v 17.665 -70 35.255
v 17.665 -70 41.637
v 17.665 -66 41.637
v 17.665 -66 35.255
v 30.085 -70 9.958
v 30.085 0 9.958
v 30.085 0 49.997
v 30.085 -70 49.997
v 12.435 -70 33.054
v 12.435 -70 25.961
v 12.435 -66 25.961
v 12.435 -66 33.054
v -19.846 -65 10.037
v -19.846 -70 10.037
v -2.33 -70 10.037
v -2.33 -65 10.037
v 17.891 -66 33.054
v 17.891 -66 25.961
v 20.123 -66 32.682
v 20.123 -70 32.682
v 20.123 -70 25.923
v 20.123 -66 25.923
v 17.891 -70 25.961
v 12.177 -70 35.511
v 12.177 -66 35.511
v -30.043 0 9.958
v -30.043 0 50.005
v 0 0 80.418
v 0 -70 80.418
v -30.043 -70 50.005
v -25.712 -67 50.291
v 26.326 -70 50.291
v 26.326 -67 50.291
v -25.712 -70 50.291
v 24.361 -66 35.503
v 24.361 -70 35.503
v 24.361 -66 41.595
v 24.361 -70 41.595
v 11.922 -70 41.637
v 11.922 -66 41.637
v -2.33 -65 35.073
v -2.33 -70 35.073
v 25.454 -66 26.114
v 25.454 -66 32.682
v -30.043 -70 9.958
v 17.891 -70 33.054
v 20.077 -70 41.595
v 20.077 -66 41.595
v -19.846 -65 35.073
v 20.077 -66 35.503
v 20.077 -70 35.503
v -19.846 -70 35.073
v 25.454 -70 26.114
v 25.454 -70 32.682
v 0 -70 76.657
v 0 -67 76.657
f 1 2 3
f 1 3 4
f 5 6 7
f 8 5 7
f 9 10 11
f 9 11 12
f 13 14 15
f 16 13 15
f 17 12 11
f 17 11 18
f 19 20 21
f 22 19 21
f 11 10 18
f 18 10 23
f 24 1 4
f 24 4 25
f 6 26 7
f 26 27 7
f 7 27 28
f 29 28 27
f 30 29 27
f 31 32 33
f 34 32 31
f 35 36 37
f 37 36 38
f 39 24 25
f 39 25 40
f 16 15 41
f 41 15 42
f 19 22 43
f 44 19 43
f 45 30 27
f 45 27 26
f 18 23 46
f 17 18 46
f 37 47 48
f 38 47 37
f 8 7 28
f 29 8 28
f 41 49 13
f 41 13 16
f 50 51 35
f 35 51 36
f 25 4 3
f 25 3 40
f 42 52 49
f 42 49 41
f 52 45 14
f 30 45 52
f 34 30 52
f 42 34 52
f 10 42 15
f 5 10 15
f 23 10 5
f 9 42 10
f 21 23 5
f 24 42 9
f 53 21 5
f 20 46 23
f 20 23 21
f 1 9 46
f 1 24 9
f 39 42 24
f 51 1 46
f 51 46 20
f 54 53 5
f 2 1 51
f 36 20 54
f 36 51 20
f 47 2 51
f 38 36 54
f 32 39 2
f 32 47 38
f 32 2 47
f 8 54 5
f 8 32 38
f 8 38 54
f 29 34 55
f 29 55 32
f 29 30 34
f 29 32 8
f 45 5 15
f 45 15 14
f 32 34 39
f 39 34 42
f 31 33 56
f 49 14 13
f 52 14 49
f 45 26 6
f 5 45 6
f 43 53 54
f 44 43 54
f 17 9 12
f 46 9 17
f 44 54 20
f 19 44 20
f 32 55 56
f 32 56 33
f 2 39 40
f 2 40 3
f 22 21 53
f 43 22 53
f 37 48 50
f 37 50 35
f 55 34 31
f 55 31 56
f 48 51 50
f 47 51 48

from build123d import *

# Parameters (mm, degrees)
PAD_DEPTH       = 70
POCKET_DEPTH    = 3
SKETCH002_W     = 17.516219
SKETCH002_H     = 25.036772
POCKET001_DEPTH = 5
POCKET002_DEPTH = 4
SKETCH004_W     = 4.283857
SKETCH004_H     = 6.092597
POCKET003_DEPTH = 4
SKETCH005_W     = 5.455842
SKETCH005_H     = 7.092594
POCKET004_DEPTH = 4
POCKET005_DEPTH = 4


with BuildPart() as part:
    # Sketch → Pad (new body)
    with BuildSketch(Plane.XZ):
        Polygon((-30.042765, 9.957636), (30.084745, 9.957636), (30.084745, 49.997265), (0, 80.418144), (-30.042765, 50.004828), align=None)
    extrude(amount=PAD_DEPTH)

    # Sketch001 (on Face7 of Pad) → Pocket (cut)
    with BuildSketch(Plane.XZ.offset(70)):
        Polygon((-25.712206, 50.291458), (0, 76.657417), (26.325865, 50.291458), align=None)
    extrude(amount=-POCKET_DEPTH, mode=Mode.SUBTRACT)

    # Sketch002 (on Face5 of Pocket) → Pocket001 (cut)
    with BuildSketch(Plane.XZ.offset(70)):
        with Locations((-11.08819, 22.555024)):
            Rectangle(SKETCH002_W, SKETCH002_H)
    extrude(amount=-POCKET001_DEPTH, mode=Mode.SUBTRACT)

    # Sketch003 (on Face5 of Pocket001) → Pocket002 (cut)
    with BuildSketch(Plane.XZ.offset(70)):
        Polygon((12.177204, 35.510704), (11.921955, 41.636688), (17.665068, 41.636688), (17.665068, 35.255455), align=None)
    extrude(amount=-POCKET002_DEPTH, mode=Mode.SUBTRACT)

    # Sketch004 (on Face5 of Pocket002) → Pocket003 (cut)
    with BuildSketch(Plane.XZ.offset(70)):
        with Locations((22.218716, 38.549026)):
            Rectangle(SKETCH004_W, SKETCH004_H)
    extrude(amount=-POCKET003_DEPTH, mode=Mode.SUBTRACT)

    # Sketch005 (on Face5 of Pocket003) → Pocket004 (cut)
    with BuildSketch(Plane.XZ.offset(70)):
        with Locations((15.162952, 29.507296)):
            Rectangle(SKETCH005_W, SKETCH005_H)
    extrude(amount=-POCKET004_DEPTH, mode=Mode.SUBTRACT)

    # Sketch006 (on Face5 of Pocket004) → Pocket005 (cut)
    with BuildSketch(Plane.XZ.offset(70)):
        Polygon((20.12318, 32.68227), (20.12318, 25.923292), (25.454206, 26.113686), (25.454206, 32.68227), align=None)
    extrude(amount=-POCKET005_DEPTH, mode=Mode.SUBTRACT)


solid = part.part
